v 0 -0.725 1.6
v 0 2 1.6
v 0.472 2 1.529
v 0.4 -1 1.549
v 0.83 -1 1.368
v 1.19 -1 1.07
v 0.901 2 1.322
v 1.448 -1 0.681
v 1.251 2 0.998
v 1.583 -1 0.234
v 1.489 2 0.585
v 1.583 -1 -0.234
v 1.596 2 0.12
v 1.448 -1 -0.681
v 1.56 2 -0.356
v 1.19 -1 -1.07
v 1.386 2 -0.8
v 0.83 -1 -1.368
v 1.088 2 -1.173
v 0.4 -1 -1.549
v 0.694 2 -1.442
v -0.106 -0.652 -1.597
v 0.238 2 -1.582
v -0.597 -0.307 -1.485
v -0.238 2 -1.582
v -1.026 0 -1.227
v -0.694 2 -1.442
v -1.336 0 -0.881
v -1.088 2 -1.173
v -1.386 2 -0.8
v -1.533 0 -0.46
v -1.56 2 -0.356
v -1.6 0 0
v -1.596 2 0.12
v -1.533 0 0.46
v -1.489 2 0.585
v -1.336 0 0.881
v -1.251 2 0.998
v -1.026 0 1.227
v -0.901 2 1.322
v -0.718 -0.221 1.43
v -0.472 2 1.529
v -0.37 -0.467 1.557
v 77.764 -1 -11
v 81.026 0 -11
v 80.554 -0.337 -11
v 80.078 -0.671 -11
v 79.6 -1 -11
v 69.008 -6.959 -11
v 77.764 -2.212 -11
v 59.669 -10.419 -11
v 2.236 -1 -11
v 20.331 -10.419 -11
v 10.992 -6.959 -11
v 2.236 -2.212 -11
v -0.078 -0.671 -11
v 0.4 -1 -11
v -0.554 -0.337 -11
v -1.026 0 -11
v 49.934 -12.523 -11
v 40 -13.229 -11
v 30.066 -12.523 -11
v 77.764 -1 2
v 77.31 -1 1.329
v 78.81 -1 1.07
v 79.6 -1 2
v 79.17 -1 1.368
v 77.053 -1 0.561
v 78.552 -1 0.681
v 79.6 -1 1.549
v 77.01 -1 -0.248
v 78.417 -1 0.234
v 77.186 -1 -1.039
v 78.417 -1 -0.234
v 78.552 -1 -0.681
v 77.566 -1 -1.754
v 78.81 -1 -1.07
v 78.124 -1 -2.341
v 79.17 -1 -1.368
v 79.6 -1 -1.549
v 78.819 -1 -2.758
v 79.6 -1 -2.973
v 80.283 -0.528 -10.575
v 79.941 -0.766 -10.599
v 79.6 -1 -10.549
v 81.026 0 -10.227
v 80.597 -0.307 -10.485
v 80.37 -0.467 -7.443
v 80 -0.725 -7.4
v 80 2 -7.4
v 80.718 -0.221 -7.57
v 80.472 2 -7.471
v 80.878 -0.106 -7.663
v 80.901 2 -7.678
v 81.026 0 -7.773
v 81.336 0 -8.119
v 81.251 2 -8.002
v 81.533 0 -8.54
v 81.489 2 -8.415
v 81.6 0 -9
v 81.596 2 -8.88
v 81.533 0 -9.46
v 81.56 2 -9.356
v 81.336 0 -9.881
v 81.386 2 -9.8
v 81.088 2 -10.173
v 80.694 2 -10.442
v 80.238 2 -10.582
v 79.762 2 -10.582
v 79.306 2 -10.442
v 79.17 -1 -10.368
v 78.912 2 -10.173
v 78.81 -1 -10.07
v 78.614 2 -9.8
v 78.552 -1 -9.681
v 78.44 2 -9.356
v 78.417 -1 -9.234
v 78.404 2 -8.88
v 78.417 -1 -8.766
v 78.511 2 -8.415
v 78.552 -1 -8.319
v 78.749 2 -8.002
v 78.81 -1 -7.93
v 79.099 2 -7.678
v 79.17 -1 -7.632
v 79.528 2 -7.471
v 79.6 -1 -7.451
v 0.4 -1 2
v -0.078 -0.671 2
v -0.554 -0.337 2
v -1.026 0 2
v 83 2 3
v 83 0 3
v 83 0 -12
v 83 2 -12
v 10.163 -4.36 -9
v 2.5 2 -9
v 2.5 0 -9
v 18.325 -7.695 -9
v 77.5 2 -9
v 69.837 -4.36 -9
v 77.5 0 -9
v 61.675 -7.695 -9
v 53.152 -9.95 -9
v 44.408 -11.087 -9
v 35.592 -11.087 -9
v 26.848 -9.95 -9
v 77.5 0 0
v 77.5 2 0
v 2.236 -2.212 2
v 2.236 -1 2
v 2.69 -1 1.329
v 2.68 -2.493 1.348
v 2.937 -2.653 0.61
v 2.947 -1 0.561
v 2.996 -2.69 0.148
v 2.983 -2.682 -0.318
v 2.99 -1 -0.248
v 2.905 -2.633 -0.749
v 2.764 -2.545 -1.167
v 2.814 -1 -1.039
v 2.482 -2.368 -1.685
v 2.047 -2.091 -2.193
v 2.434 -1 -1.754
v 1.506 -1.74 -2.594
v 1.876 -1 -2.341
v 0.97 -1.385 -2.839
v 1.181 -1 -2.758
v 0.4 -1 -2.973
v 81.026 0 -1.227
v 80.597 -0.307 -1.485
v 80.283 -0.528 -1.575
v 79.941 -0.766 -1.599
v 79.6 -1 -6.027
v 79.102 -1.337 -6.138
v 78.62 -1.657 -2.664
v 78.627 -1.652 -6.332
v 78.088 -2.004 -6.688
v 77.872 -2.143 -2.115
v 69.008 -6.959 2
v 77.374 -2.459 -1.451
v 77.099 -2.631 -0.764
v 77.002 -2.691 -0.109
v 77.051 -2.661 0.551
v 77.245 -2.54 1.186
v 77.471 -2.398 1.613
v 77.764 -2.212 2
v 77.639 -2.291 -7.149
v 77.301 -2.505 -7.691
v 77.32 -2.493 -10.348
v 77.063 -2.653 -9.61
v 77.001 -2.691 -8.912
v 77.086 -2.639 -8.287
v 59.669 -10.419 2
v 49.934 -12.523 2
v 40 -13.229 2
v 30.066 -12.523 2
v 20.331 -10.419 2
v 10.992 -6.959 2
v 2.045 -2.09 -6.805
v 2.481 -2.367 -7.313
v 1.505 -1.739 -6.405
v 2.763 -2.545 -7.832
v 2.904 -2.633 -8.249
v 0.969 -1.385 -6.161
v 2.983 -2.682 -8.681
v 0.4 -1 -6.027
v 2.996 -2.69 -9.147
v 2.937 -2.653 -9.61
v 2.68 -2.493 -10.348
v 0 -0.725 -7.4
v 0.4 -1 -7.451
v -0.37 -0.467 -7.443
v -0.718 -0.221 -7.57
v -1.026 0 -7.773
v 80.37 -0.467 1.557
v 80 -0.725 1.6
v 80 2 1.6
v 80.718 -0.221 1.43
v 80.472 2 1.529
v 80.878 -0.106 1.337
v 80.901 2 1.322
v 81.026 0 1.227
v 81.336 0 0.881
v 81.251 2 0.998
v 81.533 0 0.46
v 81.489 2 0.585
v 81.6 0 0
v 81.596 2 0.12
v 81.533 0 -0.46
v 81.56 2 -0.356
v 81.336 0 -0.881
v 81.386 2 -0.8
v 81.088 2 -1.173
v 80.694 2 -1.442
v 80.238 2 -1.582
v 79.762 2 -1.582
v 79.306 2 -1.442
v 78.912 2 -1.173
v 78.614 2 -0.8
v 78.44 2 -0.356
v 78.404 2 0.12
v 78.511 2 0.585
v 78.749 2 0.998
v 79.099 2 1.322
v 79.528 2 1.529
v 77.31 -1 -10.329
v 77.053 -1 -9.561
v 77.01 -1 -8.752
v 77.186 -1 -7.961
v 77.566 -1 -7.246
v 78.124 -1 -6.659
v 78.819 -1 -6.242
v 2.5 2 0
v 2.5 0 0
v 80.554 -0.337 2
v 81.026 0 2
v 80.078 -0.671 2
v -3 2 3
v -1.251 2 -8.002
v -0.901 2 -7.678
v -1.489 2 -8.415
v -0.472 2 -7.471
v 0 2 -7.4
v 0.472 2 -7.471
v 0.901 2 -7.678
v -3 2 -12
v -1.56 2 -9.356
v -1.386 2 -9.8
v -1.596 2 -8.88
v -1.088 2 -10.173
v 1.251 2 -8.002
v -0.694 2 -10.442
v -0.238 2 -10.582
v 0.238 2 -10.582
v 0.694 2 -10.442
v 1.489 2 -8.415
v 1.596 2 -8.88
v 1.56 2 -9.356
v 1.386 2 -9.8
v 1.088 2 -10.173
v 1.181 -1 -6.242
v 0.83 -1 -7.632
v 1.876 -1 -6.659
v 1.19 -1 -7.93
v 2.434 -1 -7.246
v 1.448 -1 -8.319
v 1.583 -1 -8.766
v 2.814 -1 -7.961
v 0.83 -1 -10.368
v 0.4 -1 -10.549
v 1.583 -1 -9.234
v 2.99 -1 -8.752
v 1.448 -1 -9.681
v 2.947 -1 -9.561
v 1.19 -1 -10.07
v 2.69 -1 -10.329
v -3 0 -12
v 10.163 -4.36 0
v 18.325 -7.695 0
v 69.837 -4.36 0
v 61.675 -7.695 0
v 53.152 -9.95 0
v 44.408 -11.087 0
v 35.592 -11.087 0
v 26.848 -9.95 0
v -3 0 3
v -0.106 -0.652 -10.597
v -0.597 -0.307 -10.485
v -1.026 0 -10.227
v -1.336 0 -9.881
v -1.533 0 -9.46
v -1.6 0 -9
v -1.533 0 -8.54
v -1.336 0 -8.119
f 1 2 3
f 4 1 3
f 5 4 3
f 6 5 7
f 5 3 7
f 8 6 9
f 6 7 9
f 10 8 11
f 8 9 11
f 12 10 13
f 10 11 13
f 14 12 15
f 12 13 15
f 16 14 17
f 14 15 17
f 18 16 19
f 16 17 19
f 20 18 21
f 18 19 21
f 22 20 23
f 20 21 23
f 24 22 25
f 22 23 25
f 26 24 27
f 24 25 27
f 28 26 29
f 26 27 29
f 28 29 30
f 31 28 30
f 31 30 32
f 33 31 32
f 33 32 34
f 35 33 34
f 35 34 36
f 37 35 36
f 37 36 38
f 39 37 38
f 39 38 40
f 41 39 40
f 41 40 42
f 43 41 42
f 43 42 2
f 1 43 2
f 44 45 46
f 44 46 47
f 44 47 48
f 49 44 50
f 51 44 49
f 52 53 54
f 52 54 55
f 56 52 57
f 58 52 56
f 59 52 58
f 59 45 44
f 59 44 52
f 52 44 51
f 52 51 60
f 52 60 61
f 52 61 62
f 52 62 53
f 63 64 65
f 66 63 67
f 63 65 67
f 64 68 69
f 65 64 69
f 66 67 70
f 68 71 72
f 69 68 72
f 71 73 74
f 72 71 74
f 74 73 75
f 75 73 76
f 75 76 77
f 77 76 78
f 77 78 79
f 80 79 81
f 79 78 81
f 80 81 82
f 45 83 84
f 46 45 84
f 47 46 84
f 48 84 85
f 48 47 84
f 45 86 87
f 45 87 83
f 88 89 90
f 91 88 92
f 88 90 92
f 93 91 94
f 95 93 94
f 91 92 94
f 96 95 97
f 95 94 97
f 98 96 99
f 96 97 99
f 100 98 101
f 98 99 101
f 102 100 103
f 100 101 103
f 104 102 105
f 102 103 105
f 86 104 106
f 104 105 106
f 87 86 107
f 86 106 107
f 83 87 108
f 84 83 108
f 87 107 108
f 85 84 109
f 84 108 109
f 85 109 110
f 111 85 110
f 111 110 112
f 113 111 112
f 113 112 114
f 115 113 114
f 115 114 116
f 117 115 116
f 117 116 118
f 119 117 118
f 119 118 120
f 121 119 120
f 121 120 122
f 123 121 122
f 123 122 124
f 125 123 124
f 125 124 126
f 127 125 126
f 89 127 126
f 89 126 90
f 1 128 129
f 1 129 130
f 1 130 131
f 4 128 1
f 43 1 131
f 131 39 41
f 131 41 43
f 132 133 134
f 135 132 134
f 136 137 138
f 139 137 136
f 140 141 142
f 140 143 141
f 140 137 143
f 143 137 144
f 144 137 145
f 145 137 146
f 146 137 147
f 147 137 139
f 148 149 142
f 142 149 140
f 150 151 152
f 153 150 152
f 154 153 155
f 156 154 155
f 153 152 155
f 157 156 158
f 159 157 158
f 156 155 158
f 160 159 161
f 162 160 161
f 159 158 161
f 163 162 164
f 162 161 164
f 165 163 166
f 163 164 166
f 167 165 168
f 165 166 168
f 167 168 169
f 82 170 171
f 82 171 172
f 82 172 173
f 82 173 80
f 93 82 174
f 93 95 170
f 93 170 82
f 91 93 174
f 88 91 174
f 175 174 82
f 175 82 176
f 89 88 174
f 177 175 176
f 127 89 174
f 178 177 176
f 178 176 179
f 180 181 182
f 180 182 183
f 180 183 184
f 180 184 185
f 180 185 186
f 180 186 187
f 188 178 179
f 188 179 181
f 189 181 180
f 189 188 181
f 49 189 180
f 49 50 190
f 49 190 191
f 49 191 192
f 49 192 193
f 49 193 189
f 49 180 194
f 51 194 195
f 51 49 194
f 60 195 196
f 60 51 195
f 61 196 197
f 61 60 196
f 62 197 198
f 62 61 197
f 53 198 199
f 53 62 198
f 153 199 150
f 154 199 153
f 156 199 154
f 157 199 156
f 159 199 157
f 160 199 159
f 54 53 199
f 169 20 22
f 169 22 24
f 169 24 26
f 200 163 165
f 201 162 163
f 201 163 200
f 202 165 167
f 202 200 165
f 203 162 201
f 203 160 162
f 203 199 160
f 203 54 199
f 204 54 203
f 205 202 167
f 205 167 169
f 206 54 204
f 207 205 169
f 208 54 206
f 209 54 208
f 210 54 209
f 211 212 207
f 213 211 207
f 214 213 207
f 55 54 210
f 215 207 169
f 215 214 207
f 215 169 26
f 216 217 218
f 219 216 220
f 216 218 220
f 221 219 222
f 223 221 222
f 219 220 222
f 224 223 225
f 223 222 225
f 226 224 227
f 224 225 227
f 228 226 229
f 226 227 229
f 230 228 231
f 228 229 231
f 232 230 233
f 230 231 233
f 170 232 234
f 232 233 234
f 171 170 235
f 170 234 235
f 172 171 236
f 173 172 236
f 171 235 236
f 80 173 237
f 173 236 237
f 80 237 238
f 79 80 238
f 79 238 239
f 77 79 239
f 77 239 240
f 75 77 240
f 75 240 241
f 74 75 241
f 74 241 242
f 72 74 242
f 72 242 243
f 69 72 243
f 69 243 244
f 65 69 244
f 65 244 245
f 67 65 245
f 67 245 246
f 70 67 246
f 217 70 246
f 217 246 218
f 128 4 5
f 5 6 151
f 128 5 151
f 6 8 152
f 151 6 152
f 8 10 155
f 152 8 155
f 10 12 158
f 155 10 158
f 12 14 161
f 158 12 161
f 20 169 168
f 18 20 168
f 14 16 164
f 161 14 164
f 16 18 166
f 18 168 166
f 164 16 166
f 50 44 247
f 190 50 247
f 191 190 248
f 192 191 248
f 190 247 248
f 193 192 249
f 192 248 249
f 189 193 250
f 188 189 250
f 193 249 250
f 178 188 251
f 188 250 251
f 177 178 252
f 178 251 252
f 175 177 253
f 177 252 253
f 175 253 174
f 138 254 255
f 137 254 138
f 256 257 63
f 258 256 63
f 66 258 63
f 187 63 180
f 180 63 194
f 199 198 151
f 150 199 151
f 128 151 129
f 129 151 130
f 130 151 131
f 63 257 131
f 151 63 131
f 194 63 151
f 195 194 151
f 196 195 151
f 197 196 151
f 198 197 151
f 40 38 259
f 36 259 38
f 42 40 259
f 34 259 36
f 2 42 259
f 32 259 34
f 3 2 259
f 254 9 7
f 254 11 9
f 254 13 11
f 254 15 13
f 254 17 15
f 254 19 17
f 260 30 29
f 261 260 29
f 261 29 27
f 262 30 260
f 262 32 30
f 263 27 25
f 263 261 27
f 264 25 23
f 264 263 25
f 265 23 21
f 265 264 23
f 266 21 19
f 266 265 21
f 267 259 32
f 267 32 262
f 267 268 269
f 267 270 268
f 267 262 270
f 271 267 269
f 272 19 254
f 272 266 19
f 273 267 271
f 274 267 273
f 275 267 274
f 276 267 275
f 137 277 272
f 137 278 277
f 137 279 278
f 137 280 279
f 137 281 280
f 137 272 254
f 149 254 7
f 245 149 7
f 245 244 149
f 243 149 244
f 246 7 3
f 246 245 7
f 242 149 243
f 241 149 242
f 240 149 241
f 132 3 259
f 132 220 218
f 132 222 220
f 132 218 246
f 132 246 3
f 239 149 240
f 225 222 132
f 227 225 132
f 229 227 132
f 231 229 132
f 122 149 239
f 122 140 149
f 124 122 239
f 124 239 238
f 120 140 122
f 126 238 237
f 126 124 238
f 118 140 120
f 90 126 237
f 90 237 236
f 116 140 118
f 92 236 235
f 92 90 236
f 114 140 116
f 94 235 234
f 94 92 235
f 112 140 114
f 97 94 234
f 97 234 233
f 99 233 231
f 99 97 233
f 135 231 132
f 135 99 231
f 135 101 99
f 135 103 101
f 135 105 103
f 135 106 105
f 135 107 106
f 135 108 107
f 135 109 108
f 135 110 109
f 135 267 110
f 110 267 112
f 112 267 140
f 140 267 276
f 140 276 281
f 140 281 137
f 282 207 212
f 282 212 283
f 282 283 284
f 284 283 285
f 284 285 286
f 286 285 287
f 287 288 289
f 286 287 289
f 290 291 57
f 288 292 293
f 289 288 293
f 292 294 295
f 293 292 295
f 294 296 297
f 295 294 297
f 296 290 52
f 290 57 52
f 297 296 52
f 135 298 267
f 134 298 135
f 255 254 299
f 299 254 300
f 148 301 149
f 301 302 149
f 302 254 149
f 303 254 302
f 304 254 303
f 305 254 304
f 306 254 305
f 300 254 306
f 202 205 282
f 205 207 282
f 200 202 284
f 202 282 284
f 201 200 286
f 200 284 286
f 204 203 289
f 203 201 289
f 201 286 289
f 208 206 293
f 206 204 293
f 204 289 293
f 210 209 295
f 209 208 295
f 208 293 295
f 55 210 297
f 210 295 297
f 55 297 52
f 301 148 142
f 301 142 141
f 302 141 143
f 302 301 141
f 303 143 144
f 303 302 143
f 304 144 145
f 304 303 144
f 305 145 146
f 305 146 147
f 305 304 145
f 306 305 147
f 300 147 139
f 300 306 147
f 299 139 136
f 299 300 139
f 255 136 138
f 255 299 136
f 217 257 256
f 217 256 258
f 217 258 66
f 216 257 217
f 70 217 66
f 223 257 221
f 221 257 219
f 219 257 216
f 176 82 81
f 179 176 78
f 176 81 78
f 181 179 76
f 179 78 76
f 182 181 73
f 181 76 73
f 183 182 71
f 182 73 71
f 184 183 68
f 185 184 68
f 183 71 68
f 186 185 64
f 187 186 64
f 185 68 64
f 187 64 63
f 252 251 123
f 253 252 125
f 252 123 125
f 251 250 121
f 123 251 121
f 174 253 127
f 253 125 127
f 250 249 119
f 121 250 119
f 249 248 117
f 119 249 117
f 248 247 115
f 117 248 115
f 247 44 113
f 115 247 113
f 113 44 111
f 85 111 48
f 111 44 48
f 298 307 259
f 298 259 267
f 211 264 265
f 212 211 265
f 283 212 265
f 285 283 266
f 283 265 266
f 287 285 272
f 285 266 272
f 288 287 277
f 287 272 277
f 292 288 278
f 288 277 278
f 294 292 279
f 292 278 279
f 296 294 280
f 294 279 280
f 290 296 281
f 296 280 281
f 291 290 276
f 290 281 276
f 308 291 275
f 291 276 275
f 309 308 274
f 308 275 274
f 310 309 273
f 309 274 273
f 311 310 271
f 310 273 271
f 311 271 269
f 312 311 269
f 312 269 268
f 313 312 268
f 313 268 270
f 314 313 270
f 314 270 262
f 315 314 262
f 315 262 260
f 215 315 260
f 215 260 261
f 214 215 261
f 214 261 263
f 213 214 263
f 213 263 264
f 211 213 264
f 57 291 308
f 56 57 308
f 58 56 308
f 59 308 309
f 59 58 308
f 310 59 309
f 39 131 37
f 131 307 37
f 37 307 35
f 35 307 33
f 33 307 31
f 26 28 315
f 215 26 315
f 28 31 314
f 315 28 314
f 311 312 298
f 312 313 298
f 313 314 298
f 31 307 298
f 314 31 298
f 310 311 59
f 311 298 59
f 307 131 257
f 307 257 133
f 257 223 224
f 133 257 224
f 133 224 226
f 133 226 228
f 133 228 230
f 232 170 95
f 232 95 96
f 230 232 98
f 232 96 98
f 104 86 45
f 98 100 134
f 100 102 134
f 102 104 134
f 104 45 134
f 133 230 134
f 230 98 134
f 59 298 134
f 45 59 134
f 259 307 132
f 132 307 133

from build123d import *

# Parameters (mm, degrees)
SKETCH_3_W               = 86
SKETCH_3_H               = 15
EXTRUDE_1_DEPTH          = 2
EXTRUDE_START            = -3
EXTRUDE_2_DEPTH          = 9
EXTRUDE_START_2          = 2
EXTRUDE_3_DEPTH          = 2
CUT_EXTRUDE_1_REACH      = 87.235
CUT_EXTRUDE_1_END_RADIUS = 68.229392493
SKETCH_7_W               = 75
SKETCH_7_H               = 9
SKETCH_8_R               = 1.6
CUT_EXTRUDE_2_DEPTH      = 86.234584505
CUT_EXTRUDE_START        = -3
SKETCH_9_R               = 3
CUT_EXTRUDE_3_DEPTH      = 83.234584523


with BuildPart() as part:
    # 草图3 → 凸台-拉伸1 (new body)
    with BuildSketch(Plane(origin=(0, 0, 0), x_dir=(1, 0, 0), z_dir=(0, 1, 0))):
        with Locations((40, 4.5)):
            Rectangle(SKETCH_3_W, SKETCH_3_H)
    extrude(amount=EXTRUDE_1_DEPTH)

    # 草图5 → 凸台-拉伸2 (add)
    with BuildSketch(Plane.XY.offset(3).offset(EXTRUDE_START)):
        with BuildLine():
            Line((2.5, 0), (-1.026425264, 0))
            ThreePointArc((-1.026425264, 0), (40, -13.229392493), (81.026425264, 0))
            Line((81.026425264, 0), (77.5, 0))
            ThreePointArc((77.5, 0), (40, -11.229392493), (2.5, 0))
        make_face()
    extrude(amount=-EXTRUDE_2_DEPTH)

    # 草图6 → 凸台-拉伸3 (add)
    with BuildSketch(Plane.XY.offset(EXTRUDE_START_2)):
        with BuildLine():
            Line((-1.026425264, 0), (81.026425264, 0))
            ThreePointArc((81.026425264, 0), (40, -13.229392493), (-1.026425264, 0))
        make_face()
    extrude_3 = extrude(amount=-EXTRUDE_3_DEPTH)

    # 镜向1: 凸台-拉伸3 across plane
    add(extrude_3.mirror(Plane.XY.offset(-4.5)))

    # 切除-拉伸1: up to this cylinder (the profile starts inside it)
    cut_extrude_1_end = Plane(origin=(40, 57, -4.5), z_dir=(0, 0, 1)) * Cylinder(CUT_EXTRUDE_1_END_RADIUS, 311.928784987, mode=Mode.PRIVATE)
    # 草图7 → 切除-拉伸1 (cut, up to the surface)
    with BuildSketch(Plane(origin=(0, 2, 0), x_dir=(1, 0, 0), z_dir=(0, 1, 0)), mode=Mode.PRIVATE) as cut_extrude_1_sk1:
        with Locations((40, 4.5)):
            Rectangle(SKETCH_7_W, SKETCH_7_H)
    cut_extrude_1_tool1 = extrude(cut_extrude_1_sk1.sketch, amount=-CUT_EXTRUDE_1_REACH, mode=Mode.PRIVATE) & cut_extrude_1_end
    add(cut_extrude_1_tool1.solids().sort_by_distance((40, 2, -4.5))[0], mode=Mode.SUBTRACT)

    # 草图8 → 切除-拉伸2 (cut, through all)
    with BuildSketch(Plane(origin=(0, 2, 0), x_dir=(1, 0, 0), z_dir=(0, 1, 0))):
        with Locations(Location((80, 0, 0), (0, 0, 270))):
            Circle(SKETCH_8_R)
        with Locations(Location((80, 9, 0), (0, 0, 270))):
            Circle(SKETCH_8_R)
        with Locations(Location((0, 0, 0), (0, 0, 270))):
            Circle(SKETCH_8_R)
        with Locations(Location((0, 9, 0), (0, 0, 270))):
            Circle(SKETCH_8_R)
    extrude(amount=-CUT_EXTRUDE_2_DEPTH, mode=Mode.SUBTRACT)

    # 草图9 → 切除-拉伸3 (cut, through all)
    with BuildSketch(Plane(origin=(0, 2, 0), x_dir=(1, 0, 0), z_dir=(0, 1, 0)).offset(CUT_EXTRUDE_START)):
        with Locations((0, 9)):
            Circle(SKETCH_9_R)
        Circle(SKETCH_9_R)
        with Locations((80, 0)):
            Circle(SKETCH_9_R)
        with Locations((80, 9)):
            Circle(SKETCH_9_R)
    extrude(amount=-CUT_EXTRUDE_3_DEPTH, mode=Mode.SUBTRACT)


solid = part.part
